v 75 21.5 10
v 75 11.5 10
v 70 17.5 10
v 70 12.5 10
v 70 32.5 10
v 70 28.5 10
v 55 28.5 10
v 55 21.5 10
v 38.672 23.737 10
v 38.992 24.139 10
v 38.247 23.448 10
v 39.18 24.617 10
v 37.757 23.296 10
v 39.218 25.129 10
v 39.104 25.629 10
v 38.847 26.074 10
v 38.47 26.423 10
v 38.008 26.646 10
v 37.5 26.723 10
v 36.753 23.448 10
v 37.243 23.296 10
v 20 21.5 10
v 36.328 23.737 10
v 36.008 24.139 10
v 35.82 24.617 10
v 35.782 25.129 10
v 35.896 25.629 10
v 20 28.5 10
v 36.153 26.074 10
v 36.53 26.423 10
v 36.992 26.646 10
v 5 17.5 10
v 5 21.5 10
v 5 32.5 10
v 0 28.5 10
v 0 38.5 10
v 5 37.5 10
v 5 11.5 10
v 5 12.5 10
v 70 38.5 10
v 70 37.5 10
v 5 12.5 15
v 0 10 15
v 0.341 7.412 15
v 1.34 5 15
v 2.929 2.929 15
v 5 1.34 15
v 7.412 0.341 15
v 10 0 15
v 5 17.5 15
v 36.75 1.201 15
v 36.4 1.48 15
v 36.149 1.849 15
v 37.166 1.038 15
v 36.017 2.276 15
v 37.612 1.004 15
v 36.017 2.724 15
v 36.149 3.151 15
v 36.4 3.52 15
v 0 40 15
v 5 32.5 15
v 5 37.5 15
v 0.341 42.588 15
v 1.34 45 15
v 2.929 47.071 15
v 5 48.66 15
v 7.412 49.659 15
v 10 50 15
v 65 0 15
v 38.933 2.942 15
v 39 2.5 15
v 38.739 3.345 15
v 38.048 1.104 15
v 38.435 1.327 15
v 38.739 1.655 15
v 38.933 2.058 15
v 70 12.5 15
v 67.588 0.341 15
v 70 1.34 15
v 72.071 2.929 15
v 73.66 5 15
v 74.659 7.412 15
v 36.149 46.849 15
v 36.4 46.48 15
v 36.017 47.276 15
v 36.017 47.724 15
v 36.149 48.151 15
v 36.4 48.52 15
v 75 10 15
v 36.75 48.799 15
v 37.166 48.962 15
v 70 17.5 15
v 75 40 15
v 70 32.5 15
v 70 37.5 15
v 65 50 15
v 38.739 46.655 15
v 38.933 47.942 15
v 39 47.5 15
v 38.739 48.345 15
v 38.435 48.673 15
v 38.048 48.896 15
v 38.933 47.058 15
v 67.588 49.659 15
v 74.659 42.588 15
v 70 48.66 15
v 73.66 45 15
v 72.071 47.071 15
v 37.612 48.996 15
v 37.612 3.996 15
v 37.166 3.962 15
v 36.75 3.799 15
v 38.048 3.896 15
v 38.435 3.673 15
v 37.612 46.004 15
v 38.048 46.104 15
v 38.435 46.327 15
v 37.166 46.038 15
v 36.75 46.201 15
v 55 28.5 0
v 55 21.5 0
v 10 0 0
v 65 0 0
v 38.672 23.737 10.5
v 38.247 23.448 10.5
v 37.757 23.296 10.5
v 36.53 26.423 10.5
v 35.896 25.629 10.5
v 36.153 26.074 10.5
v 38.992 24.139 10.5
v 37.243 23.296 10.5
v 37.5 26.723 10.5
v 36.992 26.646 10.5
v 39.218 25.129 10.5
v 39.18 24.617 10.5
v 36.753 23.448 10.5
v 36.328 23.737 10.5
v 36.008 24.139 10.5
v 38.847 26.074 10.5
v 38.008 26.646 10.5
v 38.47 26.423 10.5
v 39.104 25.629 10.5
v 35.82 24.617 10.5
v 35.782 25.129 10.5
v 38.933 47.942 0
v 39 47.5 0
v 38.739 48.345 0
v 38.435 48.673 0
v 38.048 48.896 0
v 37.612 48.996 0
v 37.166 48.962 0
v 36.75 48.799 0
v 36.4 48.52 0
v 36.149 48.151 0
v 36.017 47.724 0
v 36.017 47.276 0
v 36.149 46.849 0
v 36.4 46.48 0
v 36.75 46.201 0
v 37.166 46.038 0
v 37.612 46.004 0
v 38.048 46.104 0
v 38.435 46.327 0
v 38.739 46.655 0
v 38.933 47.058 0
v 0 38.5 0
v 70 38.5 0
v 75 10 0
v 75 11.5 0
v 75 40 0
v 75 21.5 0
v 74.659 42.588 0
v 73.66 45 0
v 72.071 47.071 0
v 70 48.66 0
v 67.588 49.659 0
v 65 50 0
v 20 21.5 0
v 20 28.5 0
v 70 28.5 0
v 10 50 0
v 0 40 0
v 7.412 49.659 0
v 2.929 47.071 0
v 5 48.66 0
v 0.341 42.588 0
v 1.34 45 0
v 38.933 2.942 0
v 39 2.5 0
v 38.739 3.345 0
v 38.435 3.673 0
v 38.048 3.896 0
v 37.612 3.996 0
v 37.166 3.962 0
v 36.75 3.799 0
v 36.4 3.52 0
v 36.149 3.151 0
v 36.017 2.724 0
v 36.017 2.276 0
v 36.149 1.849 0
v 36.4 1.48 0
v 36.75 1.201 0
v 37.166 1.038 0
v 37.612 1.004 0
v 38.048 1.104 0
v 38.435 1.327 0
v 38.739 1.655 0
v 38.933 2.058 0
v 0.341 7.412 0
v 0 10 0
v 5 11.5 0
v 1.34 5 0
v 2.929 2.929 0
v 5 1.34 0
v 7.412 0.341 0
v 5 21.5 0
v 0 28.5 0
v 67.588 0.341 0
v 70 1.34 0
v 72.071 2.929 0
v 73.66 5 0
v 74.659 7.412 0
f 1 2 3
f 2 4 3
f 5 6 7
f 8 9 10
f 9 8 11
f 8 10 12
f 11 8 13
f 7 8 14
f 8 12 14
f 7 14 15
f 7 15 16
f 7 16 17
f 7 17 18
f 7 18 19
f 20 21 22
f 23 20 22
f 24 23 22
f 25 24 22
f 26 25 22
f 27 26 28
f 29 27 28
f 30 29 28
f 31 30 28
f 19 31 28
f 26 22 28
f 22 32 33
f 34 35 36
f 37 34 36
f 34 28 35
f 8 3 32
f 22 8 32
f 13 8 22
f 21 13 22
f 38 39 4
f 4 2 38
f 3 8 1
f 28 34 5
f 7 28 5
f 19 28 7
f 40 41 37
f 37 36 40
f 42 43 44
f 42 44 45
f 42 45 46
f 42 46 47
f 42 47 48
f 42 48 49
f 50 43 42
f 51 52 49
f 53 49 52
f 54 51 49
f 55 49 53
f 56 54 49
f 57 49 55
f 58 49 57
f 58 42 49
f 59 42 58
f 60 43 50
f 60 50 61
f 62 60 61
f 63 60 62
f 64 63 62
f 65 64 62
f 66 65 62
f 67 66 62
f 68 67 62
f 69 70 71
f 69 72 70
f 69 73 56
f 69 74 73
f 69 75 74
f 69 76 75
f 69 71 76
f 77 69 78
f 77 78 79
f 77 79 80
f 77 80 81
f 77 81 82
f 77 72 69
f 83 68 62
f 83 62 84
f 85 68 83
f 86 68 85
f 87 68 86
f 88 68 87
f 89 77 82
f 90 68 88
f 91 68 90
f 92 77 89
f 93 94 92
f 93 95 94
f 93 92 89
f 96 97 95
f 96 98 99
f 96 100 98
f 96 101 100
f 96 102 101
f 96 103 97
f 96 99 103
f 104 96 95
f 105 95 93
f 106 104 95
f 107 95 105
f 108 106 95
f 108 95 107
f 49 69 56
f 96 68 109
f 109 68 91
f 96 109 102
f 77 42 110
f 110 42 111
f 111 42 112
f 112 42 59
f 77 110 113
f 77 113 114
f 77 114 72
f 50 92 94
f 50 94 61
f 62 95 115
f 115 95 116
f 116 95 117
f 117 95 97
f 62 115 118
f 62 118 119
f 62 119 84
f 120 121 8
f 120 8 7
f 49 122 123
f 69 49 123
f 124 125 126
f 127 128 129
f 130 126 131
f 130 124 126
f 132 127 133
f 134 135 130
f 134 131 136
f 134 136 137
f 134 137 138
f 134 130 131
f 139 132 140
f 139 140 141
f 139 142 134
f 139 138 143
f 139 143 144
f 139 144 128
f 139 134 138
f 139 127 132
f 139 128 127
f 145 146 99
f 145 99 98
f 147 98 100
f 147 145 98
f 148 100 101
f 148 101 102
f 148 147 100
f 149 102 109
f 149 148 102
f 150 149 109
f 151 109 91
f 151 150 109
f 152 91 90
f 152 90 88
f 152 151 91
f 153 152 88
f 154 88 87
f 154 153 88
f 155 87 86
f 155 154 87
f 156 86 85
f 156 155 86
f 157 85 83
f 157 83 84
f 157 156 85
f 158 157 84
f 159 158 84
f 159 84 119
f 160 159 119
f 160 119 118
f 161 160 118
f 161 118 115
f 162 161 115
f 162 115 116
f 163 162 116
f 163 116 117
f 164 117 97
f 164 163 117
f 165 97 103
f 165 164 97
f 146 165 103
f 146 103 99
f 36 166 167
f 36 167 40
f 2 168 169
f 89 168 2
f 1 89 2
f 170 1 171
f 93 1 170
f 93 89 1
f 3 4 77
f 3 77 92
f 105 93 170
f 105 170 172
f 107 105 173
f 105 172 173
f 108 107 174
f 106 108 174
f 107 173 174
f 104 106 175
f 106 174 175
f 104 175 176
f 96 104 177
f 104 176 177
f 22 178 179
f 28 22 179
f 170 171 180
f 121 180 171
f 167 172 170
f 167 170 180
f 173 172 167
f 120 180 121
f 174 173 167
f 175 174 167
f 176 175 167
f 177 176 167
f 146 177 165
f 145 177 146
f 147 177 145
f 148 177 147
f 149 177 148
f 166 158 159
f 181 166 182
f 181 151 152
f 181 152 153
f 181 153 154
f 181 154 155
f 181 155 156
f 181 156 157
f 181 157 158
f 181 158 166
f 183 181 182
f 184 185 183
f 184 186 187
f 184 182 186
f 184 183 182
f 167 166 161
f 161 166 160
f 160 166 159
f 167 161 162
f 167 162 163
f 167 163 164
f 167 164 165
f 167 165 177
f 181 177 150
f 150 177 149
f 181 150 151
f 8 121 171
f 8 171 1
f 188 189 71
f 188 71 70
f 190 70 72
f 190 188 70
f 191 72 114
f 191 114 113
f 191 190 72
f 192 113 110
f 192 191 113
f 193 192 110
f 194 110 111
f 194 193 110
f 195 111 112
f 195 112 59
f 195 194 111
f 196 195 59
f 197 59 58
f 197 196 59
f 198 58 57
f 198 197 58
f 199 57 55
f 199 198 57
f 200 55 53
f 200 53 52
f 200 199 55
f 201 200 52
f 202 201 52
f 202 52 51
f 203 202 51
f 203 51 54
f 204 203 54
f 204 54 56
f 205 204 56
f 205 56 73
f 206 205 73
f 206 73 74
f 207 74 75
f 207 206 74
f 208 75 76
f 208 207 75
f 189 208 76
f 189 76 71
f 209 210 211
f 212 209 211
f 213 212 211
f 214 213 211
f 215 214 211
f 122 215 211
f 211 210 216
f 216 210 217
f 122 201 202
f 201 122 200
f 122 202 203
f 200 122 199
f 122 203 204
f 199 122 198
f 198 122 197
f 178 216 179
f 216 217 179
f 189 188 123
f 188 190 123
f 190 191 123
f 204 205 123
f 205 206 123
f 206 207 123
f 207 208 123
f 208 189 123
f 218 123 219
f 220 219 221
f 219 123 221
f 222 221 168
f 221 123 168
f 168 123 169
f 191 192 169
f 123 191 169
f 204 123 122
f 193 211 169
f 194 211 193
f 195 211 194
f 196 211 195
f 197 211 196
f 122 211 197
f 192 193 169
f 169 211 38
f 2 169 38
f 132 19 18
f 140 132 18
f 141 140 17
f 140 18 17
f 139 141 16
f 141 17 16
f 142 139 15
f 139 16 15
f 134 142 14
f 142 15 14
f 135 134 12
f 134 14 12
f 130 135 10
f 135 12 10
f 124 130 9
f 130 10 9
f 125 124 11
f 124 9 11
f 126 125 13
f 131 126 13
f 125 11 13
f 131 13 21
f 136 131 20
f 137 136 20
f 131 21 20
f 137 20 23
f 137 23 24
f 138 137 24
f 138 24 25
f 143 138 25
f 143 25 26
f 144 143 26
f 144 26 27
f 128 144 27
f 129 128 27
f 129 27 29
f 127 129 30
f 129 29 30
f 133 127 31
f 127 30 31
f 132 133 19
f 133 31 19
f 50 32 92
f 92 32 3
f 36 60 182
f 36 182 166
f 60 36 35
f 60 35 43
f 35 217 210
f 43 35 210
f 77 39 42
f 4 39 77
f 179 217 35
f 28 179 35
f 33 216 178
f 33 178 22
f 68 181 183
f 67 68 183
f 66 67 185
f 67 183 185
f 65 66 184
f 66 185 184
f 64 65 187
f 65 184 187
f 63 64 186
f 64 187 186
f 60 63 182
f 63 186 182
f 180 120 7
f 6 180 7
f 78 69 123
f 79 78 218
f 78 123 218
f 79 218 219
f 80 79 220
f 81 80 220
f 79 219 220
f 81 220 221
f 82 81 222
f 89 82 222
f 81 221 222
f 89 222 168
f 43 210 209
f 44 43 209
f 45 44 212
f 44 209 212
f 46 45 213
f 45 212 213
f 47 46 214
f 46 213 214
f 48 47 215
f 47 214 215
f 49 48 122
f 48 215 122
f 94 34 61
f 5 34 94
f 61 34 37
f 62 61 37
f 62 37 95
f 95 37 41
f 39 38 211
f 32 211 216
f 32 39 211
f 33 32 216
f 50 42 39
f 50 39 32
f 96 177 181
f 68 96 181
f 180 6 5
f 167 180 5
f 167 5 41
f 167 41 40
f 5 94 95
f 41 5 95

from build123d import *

# Parameters (mm, degrees)
SKETCH1_R           = 1.5
SKETCH1_W           = 65
SKETCH1_H           = 5
BOSS_EXTRUDE1_DEPTH = 15
CUT_EXTRUDE1_REACH  = 93.378
SKETCH2_W           = 10
SKETCH2_H           = 10
SKETCH3_W           = 35
SKETCH3_H           = 15
CUT_EXTRUDE2_DEPTH  = 10
SKETCH4_R           = 1.722798044
CUT_EXTRUDE3_DEPTH  = 0.5
SKETCH5_W           = 5
SKETCH5_H           = 10
BOSS_EXTRUDE2_DEPTH = 10


with BuildPart() as part:
    # Sketch1 → Boss-Extrude1 (new body)
    with BuildSketch(Plane.XY):
        with BuildLine():
            Line((10, 0), (65, 0))
            ThreePointArc((65, 0), (72.071067812, 2.928932188), (75, 10))
            Line((75, 10), (75, 40))
            ThreePointArc((75, 40), (72.071067812, 47.071067812), (65, 50))
            Line((65, 50), (10, 50))
            ThreePointArc((10, 50), (2.928932188, 47.071067812), (0, 40))
            Line((0, 40), (0, 10))
            ThreePointArc((0, 10), (2.928932188, 2.928932188), (10, 0))
        make_face()
        with Locations((37.5, 47.5)):
            Circle(SKETCH1_R, mode=Mode.SUBTRACT)
        with Locations((37.5, 2.5)):
            Circle(SKETCH1_R, mode=Mode.SUBTRACT)
        with Locations((37.5, 35)):
            Rectangle(SKETCH1_W, SKETCH1_H, mode=Mode.SUBTRACT)
        with Locations((37.5, 15)):
            Rectangle(SKETCH1_W, SKETCH1_H, mode=Mode.SUBTRACT)
    extrude(amount=BOSS_EXTRUDE1_DEPTH)

    # Cut-Extrude1: up to this face of the body (flat: up to its plane)
    cut_extrude1_end = Plane(part.part.faces().sort_by_distance((75, 25, 7.5))[0])
    # Sketch2 → Cut-Extrude1 (cut, up to the picked face)
    with BuildSketch(Plane.ZY, mode=Mode.PRIVATE) as cut_extrude1_sk1:
        with Locations((5, 33.5)):
            Rectangle(SKETCH2_W, SKETCH2_H)
    cut_extrude1_tool1 = split(extrude(cut_extrude1_sk1.sketch, amount=-CUT_EXTRUDE1_REACH, mode=Mode.PRIVATE), bisect_by=cut_extrude1_end, keep=Keep.BOTH, mode=Mode.PRIVATE)
    # Sketch2 → Cut-Extrude1 (cut, up to the picked face)
    with BuildSketch(Plane.ZY, mode=Mode.PRIVATE) as cut_extrude1_sk2:
        with Locations((5, 16.5)):
            Rectangle(SKETCH2_W, SKETCH2_H)
    cut_extrude1_tool2 = split(extrude(cut_extrude1_sk2.sketch, amount=-CUT_EXTRUDE1_REACH, mode=Mode.PRIVATE), bisect_by=cut_extrude1_end, keep=Keep.BOTH, mode=Mode.PRIVATE)
    add(cut_extrude1_tool1.solids().sort_by(Axis((0, 33.5, 5), (1, 0, 0)))[0], mode=Mode.SUBTRACT)
    add(cut_extrude1_tool2.solids().sort_by(Axis((0, 16.5, 5), (1, 0, 0)))[0], mode=Mode.SUBTRACT)

    # Sketch3 → Cut-Extrude2 (cut)
    with BuildSketch(Plane(origin=(0, 0, 0), x_dir=(-1, 0, 0), z_dir=(0, 0, -1))):
        with Locations((-37.5, 25)):
            Rectangle(SKETCH3_W, SKETCH3_H)
    extrude(amount=-CUT_EXTRUDE2_DEPTH, mode=Mode.SUBTRACT)

    # Sketch4 → Cut-Extrude3 (cut)
    with BuildSketch(Plane(origin=(0, 0, 10), x_dir=(-1, 0, 0), z_dir=(0, 0, -1))):
        with Locations(Location((-37.5, 25, 0), (0, 0, 90))):
            Circle(SKETCH4_R)
    extrude(amount=-CUT_EXTRUDE3_DEPTH, mode=Mode.SUBTRACT)

    # Sketch5 → Boss-Extrude2 (add)
    with BuildSketch(Plane(origin=(0, 0, 10), x_dir=(-1, 0, 0), z_dir=(0, 0, -1))):
        with Locations((-72.5, 33.5)):
            Rectangle(SKETCH5_W, SKETCH5_H)
        with Locations((-2.5, 16.5)):
            Rectangle(SKETCH5_W, SKETCH5_H)
    extrude(amount=BOSS_EXTRUDE2_DEPTH)


solid = part.part
